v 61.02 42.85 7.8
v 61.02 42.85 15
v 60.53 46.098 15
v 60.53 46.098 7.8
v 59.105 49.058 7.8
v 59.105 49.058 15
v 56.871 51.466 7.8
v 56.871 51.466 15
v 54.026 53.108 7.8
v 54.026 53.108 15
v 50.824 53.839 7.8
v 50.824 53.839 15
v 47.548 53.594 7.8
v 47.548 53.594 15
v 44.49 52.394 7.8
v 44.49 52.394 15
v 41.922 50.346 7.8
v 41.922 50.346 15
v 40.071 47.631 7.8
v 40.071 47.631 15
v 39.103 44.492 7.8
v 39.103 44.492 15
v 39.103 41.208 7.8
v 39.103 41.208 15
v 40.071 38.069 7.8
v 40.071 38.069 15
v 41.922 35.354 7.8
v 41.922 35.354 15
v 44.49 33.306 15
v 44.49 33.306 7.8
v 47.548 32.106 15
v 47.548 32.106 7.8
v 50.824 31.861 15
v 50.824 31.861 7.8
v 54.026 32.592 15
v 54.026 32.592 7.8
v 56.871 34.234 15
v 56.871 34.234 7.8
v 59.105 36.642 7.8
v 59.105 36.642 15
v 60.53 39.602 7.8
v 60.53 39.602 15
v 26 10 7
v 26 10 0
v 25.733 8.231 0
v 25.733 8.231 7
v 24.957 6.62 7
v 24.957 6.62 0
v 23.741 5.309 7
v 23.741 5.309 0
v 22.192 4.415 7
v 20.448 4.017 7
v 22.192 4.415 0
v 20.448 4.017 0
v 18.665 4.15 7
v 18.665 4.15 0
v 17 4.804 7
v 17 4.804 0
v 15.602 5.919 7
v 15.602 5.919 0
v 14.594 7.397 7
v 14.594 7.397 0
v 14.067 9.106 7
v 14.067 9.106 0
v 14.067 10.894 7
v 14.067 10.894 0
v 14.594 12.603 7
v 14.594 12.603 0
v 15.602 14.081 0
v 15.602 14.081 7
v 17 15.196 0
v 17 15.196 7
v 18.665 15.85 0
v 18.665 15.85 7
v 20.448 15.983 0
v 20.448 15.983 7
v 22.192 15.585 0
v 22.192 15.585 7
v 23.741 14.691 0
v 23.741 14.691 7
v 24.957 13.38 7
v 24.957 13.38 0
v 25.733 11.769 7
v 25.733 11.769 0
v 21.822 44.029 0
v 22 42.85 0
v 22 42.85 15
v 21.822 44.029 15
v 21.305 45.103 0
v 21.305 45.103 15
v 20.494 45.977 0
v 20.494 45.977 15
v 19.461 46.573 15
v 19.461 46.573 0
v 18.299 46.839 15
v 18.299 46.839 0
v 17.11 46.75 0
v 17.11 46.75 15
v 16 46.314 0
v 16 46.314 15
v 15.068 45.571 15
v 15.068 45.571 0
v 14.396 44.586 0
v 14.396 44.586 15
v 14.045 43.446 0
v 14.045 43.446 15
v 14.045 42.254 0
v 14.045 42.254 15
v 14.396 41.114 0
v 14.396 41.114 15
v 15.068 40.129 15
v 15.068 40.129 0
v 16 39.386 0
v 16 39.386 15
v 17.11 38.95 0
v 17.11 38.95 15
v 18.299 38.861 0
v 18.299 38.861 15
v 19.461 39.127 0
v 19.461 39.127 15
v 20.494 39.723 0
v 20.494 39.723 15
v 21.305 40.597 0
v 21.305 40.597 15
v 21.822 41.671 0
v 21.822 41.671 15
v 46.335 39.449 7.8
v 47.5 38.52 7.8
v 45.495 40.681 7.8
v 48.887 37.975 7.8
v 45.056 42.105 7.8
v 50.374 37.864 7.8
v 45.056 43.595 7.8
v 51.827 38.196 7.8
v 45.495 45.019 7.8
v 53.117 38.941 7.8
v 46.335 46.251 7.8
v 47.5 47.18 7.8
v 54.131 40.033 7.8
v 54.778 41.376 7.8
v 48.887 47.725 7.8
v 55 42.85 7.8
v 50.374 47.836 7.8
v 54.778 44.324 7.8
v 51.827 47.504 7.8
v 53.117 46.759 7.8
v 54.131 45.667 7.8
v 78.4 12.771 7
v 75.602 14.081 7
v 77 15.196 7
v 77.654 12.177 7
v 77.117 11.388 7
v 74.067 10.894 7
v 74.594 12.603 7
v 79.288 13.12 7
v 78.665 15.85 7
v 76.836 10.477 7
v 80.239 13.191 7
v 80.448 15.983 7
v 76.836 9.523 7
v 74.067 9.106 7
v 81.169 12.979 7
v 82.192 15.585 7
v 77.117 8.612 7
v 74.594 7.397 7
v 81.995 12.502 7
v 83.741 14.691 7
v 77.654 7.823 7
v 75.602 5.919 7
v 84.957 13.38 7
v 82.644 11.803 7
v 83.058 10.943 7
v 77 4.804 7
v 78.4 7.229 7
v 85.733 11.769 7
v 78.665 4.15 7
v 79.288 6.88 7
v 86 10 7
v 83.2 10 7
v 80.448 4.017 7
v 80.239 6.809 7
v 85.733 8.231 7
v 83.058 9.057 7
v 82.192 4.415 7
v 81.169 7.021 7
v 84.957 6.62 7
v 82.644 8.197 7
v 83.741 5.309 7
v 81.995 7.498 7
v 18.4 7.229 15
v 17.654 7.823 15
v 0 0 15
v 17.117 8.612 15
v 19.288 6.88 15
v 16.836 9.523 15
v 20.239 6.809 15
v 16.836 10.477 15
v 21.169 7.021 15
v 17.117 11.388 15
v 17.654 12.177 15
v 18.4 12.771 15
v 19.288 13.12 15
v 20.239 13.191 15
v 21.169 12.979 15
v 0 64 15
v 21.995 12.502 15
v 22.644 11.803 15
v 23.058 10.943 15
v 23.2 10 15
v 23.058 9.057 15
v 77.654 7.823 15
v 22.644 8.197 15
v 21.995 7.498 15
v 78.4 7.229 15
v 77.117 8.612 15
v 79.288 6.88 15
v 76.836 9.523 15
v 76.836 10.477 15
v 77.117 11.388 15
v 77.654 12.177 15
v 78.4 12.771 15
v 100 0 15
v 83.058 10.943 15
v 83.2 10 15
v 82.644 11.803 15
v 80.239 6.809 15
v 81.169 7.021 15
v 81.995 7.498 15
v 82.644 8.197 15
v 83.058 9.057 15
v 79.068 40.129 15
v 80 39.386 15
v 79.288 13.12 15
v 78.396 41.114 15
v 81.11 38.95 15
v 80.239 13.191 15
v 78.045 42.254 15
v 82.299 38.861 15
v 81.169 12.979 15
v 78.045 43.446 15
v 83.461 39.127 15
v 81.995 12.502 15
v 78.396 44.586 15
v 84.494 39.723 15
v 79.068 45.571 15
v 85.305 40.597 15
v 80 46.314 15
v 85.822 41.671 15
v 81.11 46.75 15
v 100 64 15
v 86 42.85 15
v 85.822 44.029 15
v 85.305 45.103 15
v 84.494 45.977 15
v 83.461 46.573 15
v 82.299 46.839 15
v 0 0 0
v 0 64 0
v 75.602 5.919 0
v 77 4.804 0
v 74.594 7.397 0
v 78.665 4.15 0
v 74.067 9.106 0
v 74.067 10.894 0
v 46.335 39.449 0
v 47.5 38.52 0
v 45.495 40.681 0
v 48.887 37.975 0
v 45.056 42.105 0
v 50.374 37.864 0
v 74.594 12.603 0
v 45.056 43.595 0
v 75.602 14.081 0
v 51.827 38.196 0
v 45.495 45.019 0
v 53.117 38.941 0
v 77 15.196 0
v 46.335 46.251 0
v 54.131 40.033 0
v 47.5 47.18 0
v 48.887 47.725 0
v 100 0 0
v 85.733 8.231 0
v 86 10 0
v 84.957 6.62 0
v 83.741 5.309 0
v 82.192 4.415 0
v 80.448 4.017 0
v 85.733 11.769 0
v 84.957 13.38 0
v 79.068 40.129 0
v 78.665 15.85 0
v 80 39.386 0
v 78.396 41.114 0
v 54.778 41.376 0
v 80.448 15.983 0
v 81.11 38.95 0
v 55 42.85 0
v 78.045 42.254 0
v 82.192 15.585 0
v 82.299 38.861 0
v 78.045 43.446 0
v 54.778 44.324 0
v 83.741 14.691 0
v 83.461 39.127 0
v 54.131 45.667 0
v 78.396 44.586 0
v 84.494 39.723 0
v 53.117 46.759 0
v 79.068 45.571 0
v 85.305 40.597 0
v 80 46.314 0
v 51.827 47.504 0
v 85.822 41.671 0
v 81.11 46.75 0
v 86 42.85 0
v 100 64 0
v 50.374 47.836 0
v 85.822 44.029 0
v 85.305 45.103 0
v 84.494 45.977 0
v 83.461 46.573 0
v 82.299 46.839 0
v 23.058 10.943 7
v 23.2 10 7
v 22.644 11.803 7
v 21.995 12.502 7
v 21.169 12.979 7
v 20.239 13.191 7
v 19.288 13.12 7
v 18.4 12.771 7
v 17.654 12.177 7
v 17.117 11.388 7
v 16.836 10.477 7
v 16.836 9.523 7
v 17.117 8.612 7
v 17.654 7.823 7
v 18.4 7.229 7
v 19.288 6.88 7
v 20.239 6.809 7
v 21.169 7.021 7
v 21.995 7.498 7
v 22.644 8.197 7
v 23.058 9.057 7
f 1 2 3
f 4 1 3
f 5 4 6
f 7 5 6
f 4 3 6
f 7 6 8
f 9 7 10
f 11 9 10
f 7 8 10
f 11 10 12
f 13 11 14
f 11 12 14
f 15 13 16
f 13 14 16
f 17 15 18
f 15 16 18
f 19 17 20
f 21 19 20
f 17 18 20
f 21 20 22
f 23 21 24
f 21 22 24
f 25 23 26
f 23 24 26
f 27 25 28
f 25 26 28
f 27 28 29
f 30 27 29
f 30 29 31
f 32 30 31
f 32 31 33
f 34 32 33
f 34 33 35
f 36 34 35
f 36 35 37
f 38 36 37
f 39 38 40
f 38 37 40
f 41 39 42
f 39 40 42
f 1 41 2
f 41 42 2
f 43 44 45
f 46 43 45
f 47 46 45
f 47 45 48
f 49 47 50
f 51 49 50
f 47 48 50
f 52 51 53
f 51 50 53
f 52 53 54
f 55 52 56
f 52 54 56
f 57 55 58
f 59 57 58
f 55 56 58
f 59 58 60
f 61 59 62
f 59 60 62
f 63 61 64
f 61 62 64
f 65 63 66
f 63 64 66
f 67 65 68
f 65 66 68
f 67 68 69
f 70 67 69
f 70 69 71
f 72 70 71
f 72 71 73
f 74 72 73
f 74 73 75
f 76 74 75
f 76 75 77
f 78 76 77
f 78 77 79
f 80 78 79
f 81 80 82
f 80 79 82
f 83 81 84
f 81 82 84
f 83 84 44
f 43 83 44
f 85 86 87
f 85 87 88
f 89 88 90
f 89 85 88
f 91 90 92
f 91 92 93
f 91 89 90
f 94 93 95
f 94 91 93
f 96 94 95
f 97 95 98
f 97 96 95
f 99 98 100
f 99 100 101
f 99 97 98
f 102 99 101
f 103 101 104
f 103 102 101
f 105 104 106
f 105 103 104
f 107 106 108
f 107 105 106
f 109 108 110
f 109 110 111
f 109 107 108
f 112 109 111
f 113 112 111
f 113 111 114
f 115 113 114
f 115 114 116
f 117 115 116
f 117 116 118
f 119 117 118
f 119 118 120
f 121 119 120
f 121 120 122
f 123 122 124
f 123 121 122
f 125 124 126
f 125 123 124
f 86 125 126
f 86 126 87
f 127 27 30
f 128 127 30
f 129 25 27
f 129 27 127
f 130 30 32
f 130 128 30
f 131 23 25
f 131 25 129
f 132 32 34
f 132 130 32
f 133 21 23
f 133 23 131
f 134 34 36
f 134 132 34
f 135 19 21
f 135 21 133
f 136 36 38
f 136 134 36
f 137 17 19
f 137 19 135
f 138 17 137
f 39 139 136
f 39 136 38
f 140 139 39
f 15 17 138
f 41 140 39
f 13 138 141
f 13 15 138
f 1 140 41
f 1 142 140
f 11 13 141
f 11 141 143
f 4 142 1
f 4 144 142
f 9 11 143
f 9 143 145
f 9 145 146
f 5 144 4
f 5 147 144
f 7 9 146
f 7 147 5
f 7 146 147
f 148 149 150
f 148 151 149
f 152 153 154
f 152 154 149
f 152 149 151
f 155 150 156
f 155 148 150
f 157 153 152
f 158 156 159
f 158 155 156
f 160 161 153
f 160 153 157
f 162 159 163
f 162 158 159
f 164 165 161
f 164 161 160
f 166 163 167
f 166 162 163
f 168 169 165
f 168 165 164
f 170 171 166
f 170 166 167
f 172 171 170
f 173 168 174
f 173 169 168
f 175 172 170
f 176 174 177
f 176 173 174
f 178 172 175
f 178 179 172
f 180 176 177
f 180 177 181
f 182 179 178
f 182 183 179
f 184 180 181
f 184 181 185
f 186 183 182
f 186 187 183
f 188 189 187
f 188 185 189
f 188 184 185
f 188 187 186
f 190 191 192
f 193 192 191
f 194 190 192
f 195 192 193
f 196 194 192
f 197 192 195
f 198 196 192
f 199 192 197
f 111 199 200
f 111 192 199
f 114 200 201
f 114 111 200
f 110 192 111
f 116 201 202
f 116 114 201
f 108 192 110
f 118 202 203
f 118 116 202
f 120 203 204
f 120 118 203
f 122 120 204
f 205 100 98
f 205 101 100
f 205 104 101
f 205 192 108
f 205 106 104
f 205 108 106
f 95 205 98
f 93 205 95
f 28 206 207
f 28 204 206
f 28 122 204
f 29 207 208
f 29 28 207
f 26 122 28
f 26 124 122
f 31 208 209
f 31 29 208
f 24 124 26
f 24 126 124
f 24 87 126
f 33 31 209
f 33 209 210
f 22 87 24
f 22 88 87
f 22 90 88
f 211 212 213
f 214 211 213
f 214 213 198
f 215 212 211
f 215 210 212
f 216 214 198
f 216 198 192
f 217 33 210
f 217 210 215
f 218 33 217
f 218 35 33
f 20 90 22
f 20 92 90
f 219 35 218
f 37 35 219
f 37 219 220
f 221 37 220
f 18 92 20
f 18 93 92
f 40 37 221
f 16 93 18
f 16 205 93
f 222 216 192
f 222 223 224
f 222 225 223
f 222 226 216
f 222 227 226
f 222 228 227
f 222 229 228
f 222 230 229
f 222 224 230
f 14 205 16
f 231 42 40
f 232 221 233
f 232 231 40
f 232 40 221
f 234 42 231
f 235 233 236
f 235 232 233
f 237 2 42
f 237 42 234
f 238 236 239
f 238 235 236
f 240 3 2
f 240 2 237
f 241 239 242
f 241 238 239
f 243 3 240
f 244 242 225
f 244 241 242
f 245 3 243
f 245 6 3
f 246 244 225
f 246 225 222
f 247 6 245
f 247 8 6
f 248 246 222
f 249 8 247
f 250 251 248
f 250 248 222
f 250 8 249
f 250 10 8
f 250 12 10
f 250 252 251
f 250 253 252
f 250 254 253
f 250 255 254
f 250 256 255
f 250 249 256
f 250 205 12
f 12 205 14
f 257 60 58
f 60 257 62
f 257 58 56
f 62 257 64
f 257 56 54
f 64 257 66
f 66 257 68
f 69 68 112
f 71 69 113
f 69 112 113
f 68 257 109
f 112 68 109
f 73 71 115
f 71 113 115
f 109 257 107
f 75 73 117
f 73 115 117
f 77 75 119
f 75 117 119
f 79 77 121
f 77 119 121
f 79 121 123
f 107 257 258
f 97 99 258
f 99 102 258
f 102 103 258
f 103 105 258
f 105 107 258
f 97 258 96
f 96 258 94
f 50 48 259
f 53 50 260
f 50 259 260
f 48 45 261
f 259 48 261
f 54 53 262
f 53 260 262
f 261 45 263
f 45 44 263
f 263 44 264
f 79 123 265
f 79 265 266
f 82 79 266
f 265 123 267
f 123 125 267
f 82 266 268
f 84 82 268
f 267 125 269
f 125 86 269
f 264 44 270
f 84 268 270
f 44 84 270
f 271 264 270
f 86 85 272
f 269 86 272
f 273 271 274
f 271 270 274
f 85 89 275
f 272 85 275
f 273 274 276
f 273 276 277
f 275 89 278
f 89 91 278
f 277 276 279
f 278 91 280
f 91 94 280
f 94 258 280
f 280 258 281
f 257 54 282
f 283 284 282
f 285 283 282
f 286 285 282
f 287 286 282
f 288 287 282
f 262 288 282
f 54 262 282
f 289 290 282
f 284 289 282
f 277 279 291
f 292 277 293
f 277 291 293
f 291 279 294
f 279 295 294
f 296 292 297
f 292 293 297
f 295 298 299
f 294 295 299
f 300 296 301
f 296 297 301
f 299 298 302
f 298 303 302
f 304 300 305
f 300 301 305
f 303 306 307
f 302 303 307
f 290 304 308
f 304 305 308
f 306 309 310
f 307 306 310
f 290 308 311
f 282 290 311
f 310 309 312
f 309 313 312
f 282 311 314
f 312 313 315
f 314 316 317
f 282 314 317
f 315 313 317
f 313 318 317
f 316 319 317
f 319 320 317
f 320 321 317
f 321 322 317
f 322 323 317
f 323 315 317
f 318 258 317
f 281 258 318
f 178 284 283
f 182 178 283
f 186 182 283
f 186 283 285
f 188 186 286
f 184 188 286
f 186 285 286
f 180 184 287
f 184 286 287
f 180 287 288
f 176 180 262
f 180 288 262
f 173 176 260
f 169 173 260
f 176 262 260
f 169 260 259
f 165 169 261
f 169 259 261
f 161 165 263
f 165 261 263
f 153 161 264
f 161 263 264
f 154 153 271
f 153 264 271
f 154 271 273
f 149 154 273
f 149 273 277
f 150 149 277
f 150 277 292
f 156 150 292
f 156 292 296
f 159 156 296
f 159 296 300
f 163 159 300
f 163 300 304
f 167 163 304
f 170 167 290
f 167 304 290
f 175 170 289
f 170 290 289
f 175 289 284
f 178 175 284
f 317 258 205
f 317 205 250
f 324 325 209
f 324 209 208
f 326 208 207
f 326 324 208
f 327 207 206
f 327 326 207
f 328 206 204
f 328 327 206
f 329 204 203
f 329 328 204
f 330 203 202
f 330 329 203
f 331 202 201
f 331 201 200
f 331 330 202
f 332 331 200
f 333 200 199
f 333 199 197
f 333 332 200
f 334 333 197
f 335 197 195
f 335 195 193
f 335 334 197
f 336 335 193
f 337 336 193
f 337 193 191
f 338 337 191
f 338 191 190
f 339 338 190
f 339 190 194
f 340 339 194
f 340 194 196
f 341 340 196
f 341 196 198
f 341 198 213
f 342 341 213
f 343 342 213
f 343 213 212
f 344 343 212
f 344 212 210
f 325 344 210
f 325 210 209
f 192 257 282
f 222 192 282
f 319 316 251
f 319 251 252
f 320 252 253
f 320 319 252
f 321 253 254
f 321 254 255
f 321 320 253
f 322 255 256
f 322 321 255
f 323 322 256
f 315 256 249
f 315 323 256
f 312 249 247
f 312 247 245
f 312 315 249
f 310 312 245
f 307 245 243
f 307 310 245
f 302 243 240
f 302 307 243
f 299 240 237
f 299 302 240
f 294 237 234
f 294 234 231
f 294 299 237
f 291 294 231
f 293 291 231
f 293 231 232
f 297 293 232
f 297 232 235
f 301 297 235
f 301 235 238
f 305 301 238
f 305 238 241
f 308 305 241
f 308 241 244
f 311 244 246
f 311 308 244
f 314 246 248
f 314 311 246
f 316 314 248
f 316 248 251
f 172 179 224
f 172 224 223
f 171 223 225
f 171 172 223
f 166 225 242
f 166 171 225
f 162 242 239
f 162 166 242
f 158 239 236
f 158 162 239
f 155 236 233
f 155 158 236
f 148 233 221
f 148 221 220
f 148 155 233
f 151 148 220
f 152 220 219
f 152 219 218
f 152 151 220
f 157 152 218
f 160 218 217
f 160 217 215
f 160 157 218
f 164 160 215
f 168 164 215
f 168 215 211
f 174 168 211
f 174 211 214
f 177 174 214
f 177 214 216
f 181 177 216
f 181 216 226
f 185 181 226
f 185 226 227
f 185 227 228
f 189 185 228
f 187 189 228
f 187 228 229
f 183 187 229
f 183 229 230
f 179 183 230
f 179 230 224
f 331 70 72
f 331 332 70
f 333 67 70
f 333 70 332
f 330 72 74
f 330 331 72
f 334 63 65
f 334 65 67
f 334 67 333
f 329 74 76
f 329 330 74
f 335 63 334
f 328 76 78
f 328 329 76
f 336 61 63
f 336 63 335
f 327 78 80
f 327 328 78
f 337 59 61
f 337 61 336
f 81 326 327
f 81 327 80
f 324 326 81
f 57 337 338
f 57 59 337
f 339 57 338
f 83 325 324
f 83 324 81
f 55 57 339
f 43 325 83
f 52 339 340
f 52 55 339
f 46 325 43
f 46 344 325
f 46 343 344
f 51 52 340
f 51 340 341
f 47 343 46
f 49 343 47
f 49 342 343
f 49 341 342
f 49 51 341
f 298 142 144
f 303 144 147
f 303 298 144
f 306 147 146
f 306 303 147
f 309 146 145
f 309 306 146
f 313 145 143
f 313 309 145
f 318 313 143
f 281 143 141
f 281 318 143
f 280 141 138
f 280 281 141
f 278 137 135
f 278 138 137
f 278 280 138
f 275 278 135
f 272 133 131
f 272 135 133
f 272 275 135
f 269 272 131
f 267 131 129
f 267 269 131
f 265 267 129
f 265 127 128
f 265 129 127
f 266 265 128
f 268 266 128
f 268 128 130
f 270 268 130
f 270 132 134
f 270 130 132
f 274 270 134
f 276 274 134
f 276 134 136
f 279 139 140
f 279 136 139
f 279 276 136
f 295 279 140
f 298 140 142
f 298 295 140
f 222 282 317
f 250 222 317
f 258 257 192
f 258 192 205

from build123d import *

# Parameters (mm, degrees)
SKETCH_W        = 100
SKETCH_H        = 64
SKETCH_R        = 5
SKETCH_R_2      = 3.2
SKETCH_R_3      = 4
PAD_DEPTH       = 15
SKETCH001_R     = 11.02
POCKET_DEPTH    = 7.2
SKETCH002_R     = 6
POCKET001_DEPTH = 7


with BuildPart() as part:
    # Sketch → Pad (new body)
    with BuildSketch(Plane.XY):
        with Locations((50, 32)):
            Rectangle(SKETCH_W, SKETCH_H)
        with Locations((50, 42.85)):
            Circle(SKETCH_R, mode=Mode.SUBTRACT)
        with Locations((20, 10)):
            Circle(SKETCH_R_2, mode=Mode.SUBTRACT)
        with Locations((80, 10)):
            Circle(SKETCH_R_2, mode=Mode.SUBTRACT)
        with Locations((82, 42.85)):
            Circle(SKETCH_R_3, mode=Mode.SUBTRACT)
        with Locations((18, 42.85)):
            Circle(SKETCH_R_3, mode=Mode.SUBTRACT)
    extrude(amount=PAD_DEPTH)

    # Sketch001 (on Face11 of Pad) → Pocket (cut)
    with BuildSketch(Plane.XY.offset(15)):
        with Locations((50, 42.85)):
            Circle(SKETCH001_R)
    extrude(amount=-POCKET_DEPTH, mode=Mode.SUBTRACT)

    # Sketch002 (on Face4 of Pocket) → Pocket001 (cut)
    with BuildSketch(Plane(origin=(0, 0, 0), x_dir=(1, 0, 0), z_dir=(0, 0, -1))):
        with Locations((20, -10)):
            Circle(SKETCH002_R)
        with Locations((80, -10)):
            Circle(SKETCH002_R)
    extrude(amount=-POCKET001_DEPTH, mode=Mode.SUBTRACT)


solid = part.part
